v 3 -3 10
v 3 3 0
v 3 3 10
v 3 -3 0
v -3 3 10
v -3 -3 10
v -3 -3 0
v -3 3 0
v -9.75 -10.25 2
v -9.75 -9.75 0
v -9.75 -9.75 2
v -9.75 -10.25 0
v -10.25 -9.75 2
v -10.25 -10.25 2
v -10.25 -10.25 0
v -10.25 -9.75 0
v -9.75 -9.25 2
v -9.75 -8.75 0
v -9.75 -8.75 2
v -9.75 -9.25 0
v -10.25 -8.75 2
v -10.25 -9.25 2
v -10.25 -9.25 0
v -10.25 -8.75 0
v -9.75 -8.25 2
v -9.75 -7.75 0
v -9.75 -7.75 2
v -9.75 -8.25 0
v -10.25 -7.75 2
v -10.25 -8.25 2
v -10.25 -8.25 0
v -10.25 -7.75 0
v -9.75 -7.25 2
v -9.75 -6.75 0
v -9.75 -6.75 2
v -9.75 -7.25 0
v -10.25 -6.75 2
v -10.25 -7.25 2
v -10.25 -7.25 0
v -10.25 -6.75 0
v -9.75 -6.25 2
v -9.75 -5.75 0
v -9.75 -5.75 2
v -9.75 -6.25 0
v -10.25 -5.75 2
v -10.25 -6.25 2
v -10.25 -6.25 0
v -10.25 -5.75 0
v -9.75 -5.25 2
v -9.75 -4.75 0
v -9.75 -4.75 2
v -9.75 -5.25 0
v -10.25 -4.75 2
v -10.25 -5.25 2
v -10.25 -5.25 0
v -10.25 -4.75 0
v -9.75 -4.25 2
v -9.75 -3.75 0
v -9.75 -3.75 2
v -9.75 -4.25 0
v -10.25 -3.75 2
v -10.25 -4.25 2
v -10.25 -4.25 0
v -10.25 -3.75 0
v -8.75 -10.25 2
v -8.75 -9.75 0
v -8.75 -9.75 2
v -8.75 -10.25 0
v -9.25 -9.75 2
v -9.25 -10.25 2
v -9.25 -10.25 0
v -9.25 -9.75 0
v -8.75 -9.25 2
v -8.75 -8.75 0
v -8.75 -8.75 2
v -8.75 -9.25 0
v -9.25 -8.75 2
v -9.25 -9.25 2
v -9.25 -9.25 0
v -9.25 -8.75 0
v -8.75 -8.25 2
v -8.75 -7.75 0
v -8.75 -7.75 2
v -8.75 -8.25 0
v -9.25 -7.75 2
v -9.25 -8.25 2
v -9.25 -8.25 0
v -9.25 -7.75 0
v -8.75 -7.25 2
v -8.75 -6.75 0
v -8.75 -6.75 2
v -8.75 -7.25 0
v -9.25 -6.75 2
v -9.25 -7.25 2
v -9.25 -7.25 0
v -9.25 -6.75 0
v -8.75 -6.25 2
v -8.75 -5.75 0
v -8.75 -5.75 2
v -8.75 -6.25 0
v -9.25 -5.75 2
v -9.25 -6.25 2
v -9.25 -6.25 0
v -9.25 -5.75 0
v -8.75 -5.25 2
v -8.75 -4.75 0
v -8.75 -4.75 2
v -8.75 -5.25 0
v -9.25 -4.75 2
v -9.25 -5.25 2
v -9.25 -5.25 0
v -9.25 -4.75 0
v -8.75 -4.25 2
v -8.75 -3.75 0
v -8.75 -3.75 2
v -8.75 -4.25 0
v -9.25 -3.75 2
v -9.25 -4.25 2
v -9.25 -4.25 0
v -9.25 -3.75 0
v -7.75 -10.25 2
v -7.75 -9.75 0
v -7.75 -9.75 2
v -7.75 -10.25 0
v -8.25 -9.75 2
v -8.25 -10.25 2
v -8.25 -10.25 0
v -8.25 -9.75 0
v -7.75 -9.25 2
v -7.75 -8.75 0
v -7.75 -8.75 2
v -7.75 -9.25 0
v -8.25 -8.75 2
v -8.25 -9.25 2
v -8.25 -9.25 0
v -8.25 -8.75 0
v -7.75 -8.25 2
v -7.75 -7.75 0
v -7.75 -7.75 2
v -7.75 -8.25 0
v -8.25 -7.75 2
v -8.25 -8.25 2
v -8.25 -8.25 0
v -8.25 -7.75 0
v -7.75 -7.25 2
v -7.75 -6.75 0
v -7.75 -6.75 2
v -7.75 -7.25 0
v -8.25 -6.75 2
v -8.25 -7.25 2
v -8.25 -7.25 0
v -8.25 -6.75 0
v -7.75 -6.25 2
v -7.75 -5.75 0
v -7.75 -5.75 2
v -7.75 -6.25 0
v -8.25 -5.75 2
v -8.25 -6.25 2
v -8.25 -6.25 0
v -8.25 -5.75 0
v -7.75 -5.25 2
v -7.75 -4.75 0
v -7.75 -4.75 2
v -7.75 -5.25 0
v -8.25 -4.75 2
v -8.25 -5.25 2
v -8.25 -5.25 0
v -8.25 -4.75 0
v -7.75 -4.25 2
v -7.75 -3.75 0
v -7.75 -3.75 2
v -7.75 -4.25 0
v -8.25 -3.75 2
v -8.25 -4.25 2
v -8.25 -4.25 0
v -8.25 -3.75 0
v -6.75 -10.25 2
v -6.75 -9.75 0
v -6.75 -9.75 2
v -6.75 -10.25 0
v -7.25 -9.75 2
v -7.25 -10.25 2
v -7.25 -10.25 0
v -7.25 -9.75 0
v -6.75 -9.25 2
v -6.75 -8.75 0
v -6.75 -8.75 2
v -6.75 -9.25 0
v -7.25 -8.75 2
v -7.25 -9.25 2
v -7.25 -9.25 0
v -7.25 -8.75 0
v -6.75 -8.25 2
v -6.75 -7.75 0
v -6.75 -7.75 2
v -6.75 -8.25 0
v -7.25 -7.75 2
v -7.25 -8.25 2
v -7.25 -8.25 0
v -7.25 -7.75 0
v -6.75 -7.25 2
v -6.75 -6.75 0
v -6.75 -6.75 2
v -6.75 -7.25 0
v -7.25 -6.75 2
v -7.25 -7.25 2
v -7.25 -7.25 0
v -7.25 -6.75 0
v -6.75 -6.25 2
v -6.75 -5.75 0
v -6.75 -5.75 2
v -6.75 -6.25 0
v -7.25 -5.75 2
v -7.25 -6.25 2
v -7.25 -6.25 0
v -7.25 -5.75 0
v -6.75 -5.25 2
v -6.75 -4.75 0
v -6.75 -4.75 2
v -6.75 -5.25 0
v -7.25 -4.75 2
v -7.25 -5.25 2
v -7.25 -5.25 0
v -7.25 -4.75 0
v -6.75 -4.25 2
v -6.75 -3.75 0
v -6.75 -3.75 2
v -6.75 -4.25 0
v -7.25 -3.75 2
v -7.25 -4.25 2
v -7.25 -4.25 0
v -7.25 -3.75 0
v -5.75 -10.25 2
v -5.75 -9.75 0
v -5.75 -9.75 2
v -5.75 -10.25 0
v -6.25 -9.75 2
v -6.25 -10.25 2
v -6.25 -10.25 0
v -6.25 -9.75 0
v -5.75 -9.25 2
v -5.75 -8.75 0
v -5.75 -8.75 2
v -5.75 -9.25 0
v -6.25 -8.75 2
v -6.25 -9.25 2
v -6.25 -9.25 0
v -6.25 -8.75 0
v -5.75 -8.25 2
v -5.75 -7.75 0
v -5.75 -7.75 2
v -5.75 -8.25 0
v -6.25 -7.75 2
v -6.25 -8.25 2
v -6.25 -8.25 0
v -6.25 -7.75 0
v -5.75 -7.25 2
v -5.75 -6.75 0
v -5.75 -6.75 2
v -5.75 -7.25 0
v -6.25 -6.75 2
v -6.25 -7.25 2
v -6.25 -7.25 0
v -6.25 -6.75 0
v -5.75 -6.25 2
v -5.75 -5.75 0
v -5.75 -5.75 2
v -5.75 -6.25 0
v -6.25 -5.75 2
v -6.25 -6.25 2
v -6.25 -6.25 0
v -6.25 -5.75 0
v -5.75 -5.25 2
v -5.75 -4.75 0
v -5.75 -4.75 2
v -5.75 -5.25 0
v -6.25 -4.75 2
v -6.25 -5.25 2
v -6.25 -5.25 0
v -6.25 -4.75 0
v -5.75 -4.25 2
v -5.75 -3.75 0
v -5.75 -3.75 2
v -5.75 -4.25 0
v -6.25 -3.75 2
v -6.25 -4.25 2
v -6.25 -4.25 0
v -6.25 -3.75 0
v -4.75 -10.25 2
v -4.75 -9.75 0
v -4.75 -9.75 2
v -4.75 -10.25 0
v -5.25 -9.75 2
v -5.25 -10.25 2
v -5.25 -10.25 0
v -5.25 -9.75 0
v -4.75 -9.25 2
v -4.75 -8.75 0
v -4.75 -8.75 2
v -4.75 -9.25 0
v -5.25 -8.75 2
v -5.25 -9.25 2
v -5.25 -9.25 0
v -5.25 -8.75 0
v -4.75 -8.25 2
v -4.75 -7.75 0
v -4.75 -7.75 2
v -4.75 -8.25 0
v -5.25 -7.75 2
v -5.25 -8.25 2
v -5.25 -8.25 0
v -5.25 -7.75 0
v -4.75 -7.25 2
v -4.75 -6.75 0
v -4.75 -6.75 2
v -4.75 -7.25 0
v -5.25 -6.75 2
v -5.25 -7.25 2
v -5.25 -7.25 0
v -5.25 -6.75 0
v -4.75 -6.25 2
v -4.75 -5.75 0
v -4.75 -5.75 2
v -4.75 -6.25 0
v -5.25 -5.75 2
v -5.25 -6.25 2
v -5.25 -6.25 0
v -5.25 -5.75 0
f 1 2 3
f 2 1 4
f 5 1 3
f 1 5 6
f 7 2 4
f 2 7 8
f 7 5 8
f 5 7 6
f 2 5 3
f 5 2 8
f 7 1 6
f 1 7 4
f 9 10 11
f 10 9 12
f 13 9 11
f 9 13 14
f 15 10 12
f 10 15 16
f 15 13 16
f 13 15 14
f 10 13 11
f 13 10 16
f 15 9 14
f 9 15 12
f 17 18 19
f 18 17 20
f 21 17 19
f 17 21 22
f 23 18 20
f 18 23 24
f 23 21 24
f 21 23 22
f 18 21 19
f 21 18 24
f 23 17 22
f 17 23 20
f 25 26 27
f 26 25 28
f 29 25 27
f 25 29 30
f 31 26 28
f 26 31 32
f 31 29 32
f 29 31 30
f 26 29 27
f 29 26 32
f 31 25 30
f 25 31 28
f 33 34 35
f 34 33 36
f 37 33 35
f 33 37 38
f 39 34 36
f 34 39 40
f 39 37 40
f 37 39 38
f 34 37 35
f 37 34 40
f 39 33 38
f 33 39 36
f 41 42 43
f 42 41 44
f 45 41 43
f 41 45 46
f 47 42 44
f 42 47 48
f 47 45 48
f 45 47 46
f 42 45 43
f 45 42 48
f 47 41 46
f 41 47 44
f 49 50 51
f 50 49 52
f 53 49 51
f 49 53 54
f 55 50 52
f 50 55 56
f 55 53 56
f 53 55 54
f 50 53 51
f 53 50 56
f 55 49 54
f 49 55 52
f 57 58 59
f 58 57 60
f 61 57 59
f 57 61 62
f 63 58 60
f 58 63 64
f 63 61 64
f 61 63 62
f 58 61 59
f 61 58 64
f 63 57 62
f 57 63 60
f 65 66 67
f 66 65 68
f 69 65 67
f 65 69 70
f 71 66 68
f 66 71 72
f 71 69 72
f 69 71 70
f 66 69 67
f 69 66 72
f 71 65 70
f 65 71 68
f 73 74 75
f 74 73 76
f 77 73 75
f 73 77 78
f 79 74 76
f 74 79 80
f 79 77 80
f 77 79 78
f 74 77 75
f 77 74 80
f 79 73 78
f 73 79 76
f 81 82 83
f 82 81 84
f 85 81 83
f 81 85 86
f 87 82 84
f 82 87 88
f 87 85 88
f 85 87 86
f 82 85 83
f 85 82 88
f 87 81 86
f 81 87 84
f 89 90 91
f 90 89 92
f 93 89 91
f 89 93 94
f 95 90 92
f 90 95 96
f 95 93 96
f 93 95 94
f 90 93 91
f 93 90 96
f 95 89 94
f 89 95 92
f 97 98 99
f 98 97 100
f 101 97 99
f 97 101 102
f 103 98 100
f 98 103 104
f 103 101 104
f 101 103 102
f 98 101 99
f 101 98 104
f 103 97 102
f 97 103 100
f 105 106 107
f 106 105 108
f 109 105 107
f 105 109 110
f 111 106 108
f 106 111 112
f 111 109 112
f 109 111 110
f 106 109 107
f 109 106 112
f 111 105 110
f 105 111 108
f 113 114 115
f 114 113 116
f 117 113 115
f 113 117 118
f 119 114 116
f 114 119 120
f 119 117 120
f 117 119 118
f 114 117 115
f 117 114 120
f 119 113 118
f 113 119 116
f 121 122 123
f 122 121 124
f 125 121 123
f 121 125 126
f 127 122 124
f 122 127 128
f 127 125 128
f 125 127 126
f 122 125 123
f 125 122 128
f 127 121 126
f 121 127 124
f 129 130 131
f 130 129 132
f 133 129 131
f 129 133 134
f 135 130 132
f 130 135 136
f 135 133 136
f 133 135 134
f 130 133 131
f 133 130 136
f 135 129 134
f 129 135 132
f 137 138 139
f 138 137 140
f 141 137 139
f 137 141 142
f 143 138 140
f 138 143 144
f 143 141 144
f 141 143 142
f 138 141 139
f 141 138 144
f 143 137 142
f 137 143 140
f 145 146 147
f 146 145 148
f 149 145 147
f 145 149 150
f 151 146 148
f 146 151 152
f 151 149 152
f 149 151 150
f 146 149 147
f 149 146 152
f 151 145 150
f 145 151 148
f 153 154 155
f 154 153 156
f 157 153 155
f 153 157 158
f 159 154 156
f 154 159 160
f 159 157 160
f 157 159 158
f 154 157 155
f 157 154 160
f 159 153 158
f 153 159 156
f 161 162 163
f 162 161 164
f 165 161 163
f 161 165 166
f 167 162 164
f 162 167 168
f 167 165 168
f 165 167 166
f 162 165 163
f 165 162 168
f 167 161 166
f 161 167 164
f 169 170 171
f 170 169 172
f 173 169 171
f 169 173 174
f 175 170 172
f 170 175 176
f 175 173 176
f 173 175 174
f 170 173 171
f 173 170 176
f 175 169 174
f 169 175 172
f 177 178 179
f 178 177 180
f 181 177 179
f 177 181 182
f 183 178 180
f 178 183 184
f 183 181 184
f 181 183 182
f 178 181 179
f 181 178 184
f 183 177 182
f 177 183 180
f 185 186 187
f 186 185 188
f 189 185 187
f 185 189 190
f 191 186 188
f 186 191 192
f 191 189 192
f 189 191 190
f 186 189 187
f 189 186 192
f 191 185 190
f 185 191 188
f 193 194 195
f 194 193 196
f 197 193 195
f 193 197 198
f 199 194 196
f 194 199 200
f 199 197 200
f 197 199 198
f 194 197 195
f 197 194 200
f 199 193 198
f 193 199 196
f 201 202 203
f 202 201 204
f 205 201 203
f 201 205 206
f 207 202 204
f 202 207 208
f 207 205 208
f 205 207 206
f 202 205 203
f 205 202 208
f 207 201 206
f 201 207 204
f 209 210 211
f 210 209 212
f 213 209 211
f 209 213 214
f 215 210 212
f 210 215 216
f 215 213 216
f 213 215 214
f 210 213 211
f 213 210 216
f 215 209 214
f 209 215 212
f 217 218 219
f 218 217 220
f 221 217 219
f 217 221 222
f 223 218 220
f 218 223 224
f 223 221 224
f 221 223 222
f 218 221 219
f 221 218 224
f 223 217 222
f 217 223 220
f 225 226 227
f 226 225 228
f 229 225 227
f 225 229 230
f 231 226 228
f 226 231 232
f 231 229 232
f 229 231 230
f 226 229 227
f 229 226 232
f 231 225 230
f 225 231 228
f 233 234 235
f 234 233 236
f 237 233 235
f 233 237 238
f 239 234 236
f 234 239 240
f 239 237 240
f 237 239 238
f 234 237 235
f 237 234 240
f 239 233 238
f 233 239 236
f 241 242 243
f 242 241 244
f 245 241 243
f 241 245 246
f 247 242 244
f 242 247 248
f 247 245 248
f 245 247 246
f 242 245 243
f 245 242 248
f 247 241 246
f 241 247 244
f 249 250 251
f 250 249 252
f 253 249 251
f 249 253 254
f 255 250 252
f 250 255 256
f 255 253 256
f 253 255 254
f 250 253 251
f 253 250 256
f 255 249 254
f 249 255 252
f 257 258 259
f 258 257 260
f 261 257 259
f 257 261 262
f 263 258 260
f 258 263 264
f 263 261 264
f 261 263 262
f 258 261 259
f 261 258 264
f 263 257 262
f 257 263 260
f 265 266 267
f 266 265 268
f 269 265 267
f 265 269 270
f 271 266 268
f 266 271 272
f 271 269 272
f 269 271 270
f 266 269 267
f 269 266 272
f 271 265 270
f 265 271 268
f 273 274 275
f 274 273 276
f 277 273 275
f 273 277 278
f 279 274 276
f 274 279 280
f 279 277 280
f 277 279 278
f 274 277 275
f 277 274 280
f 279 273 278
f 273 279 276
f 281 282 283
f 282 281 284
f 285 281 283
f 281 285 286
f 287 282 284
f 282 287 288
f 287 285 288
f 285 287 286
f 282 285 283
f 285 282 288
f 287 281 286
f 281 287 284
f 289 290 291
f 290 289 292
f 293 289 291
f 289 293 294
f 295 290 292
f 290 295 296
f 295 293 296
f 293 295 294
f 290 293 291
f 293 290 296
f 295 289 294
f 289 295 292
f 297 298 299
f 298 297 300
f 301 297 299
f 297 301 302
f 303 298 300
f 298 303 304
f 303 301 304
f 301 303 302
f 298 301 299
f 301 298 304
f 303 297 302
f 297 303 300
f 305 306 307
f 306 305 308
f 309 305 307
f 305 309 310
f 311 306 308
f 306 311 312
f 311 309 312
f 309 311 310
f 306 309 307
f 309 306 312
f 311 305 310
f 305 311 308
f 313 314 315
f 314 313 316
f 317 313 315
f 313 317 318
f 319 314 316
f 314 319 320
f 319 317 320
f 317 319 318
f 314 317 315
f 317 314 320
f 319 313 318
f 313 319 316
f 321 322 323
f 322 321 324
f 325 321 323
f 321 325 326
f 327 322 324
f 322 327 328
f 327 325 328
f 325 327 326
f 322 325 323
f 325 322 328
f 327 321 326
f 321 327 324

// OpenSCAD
translate([0, 0, 5]) color([0,1,0,0.9]) cube([6, 6, 10], center=true);
translate([-10, -10, 1]) color([1,0,0]) cube([0.5, 0.5, 2], center=true);
translate([-10, -9, 1]) color([1,0,0]) cube([0.5, 0.5, 2], center=true);
translate([-10, -8, 1]) color([1,0,0]) cube([0.5, 0.5, 2], center=true);
translate([-10, -7, 1]) color([1,0,0]) cube([0.5, 0.5, 2], center=true);
translate([-10, -6, 1]) color([1,0,0]) cube([0.5, 0.5, 2], center=true);
translate([-10, -5, 1]) color([1,0,0]) cube([0.5, 0.5, 2], center=true);
translate([-10, -4, 1]) color([1,0,0]) cube([0.5, 0.5, 2], center=true);
translate([-9, -10, 1]) color([1,0,0]) cube([0.5, 0.5, 2], center=true);
translate([-9, -9, 1]) color([1,0,0]) cube([0.5, 0.5, 2], center=true);
translate([-9, -8, 1]) color([1,0,0]) cube([0.5, 0.5, 2], center=true);
translate([-9, -7, 1]) color([1,0,0]) cube([0.5, 0.5, 2], center=true);
translate([-9, -6, 1]) color([1,0,0]) cube([0.5, 0.5, 2], center=true);
translate([-9, -5, 1]) color([1,0,0]) cube([0.5, 0.5, 2], center=true);
translate([-9, -4, 1]) color([1,0,0]) cube([0.5, 0.5, 2], center=true);
translate([-8, -10, 1]) color([1,0,0]) cube([0.5, 0.5, 2], center=true);
translate([-8, -9, 1]) color([1,0,0]) cube([0.5, 0.5, 2], center=true);
translate([-8, -8, 1]) color([1,0,0]) cube([0.5, 0.5, 2], center=true);
translate([-8, -7, 1]) color([1,0,0]) cube([0.5, 0.5, 2], center=true);
translate([-8, -6, 1]) color([1,0,0]) cube([0.5, 0.5, 2], center=true);
translate([-8, -5, 1]) color([1,0,0]) cube([0.5, 0.5, 2], center=true);
translate([-8, -4, 1]) color([1,0,0]) cube([0.5, 0.5, 2], center=true);
translate([-7, -10, 1]) color([1,0,0]) cube([0.5, 0.5, 2], center=true);
translate([-7, -9, 1]) color([1,0,0]) cube([0.5, 0.5, 2], center=true);
translate([-7, -8, 1]) color([1,0,0]) cube([0.5, 0.5, 2], center=true);
translate([-7, -7, 1]) color([1,0,0]) cube([0.5, 0.5, 2], center=true);
translate([-7, -6, 1]) color([1,0,0]) cube([0.5, 0.5, 2], center=true);
translate([-7, -5, 1]) color([1,0,0]) cube([0.5, 0.5, 2], center=true);
translate([-7, -4, 1]) color([1,0,0]) cube([0.5, 0.5, 2], center=true);
translate([-6, -10, 1]) color([1,0,0]) cube([0.5, 0.5, 2], center=true);
translate([-6, -9, 1]) color([1,0,0]) cube([0.5, 0.5, 2], center=true);
translate([-6, -8, 1]) color([1,0,0]) cube([0.5, 0.5, 2], center=true);
translate([-6, -7, 1]) color([1,0,0]) cube([0.5, 0.5, 2], center=true);
translate([-6, -6, 1]) color([1,0,0]) cube([0.5, 0.5, 2], center=true);
translate([-6, -5, 1]) color([1,0,0]) cube([0.5, 0.5, 2], center=true);
translate([-6, -4, 1]) color([1,0,0]) cube([0.5, 0.5, 2], center=true);
translate([-5, -10, 1]) color([1,0,0]) cube([0.5, 0.5, 2], center=true);
translate([-5, -9, 1]) color([1,0,0]) cube([0.5, 0.5, 2], center=true);
translate([-5, -8, 1]) color([1,0,0]) cube([0.5, 0.5, 2], center=true);
translate([-5, -7, 1]) color([1,0,0]) cube([0.5, 0.5, 2], center=true);
translate([-5, -6, 1]) color([1,0,0]) cube([0.5, 0.5, 2], center=true);
